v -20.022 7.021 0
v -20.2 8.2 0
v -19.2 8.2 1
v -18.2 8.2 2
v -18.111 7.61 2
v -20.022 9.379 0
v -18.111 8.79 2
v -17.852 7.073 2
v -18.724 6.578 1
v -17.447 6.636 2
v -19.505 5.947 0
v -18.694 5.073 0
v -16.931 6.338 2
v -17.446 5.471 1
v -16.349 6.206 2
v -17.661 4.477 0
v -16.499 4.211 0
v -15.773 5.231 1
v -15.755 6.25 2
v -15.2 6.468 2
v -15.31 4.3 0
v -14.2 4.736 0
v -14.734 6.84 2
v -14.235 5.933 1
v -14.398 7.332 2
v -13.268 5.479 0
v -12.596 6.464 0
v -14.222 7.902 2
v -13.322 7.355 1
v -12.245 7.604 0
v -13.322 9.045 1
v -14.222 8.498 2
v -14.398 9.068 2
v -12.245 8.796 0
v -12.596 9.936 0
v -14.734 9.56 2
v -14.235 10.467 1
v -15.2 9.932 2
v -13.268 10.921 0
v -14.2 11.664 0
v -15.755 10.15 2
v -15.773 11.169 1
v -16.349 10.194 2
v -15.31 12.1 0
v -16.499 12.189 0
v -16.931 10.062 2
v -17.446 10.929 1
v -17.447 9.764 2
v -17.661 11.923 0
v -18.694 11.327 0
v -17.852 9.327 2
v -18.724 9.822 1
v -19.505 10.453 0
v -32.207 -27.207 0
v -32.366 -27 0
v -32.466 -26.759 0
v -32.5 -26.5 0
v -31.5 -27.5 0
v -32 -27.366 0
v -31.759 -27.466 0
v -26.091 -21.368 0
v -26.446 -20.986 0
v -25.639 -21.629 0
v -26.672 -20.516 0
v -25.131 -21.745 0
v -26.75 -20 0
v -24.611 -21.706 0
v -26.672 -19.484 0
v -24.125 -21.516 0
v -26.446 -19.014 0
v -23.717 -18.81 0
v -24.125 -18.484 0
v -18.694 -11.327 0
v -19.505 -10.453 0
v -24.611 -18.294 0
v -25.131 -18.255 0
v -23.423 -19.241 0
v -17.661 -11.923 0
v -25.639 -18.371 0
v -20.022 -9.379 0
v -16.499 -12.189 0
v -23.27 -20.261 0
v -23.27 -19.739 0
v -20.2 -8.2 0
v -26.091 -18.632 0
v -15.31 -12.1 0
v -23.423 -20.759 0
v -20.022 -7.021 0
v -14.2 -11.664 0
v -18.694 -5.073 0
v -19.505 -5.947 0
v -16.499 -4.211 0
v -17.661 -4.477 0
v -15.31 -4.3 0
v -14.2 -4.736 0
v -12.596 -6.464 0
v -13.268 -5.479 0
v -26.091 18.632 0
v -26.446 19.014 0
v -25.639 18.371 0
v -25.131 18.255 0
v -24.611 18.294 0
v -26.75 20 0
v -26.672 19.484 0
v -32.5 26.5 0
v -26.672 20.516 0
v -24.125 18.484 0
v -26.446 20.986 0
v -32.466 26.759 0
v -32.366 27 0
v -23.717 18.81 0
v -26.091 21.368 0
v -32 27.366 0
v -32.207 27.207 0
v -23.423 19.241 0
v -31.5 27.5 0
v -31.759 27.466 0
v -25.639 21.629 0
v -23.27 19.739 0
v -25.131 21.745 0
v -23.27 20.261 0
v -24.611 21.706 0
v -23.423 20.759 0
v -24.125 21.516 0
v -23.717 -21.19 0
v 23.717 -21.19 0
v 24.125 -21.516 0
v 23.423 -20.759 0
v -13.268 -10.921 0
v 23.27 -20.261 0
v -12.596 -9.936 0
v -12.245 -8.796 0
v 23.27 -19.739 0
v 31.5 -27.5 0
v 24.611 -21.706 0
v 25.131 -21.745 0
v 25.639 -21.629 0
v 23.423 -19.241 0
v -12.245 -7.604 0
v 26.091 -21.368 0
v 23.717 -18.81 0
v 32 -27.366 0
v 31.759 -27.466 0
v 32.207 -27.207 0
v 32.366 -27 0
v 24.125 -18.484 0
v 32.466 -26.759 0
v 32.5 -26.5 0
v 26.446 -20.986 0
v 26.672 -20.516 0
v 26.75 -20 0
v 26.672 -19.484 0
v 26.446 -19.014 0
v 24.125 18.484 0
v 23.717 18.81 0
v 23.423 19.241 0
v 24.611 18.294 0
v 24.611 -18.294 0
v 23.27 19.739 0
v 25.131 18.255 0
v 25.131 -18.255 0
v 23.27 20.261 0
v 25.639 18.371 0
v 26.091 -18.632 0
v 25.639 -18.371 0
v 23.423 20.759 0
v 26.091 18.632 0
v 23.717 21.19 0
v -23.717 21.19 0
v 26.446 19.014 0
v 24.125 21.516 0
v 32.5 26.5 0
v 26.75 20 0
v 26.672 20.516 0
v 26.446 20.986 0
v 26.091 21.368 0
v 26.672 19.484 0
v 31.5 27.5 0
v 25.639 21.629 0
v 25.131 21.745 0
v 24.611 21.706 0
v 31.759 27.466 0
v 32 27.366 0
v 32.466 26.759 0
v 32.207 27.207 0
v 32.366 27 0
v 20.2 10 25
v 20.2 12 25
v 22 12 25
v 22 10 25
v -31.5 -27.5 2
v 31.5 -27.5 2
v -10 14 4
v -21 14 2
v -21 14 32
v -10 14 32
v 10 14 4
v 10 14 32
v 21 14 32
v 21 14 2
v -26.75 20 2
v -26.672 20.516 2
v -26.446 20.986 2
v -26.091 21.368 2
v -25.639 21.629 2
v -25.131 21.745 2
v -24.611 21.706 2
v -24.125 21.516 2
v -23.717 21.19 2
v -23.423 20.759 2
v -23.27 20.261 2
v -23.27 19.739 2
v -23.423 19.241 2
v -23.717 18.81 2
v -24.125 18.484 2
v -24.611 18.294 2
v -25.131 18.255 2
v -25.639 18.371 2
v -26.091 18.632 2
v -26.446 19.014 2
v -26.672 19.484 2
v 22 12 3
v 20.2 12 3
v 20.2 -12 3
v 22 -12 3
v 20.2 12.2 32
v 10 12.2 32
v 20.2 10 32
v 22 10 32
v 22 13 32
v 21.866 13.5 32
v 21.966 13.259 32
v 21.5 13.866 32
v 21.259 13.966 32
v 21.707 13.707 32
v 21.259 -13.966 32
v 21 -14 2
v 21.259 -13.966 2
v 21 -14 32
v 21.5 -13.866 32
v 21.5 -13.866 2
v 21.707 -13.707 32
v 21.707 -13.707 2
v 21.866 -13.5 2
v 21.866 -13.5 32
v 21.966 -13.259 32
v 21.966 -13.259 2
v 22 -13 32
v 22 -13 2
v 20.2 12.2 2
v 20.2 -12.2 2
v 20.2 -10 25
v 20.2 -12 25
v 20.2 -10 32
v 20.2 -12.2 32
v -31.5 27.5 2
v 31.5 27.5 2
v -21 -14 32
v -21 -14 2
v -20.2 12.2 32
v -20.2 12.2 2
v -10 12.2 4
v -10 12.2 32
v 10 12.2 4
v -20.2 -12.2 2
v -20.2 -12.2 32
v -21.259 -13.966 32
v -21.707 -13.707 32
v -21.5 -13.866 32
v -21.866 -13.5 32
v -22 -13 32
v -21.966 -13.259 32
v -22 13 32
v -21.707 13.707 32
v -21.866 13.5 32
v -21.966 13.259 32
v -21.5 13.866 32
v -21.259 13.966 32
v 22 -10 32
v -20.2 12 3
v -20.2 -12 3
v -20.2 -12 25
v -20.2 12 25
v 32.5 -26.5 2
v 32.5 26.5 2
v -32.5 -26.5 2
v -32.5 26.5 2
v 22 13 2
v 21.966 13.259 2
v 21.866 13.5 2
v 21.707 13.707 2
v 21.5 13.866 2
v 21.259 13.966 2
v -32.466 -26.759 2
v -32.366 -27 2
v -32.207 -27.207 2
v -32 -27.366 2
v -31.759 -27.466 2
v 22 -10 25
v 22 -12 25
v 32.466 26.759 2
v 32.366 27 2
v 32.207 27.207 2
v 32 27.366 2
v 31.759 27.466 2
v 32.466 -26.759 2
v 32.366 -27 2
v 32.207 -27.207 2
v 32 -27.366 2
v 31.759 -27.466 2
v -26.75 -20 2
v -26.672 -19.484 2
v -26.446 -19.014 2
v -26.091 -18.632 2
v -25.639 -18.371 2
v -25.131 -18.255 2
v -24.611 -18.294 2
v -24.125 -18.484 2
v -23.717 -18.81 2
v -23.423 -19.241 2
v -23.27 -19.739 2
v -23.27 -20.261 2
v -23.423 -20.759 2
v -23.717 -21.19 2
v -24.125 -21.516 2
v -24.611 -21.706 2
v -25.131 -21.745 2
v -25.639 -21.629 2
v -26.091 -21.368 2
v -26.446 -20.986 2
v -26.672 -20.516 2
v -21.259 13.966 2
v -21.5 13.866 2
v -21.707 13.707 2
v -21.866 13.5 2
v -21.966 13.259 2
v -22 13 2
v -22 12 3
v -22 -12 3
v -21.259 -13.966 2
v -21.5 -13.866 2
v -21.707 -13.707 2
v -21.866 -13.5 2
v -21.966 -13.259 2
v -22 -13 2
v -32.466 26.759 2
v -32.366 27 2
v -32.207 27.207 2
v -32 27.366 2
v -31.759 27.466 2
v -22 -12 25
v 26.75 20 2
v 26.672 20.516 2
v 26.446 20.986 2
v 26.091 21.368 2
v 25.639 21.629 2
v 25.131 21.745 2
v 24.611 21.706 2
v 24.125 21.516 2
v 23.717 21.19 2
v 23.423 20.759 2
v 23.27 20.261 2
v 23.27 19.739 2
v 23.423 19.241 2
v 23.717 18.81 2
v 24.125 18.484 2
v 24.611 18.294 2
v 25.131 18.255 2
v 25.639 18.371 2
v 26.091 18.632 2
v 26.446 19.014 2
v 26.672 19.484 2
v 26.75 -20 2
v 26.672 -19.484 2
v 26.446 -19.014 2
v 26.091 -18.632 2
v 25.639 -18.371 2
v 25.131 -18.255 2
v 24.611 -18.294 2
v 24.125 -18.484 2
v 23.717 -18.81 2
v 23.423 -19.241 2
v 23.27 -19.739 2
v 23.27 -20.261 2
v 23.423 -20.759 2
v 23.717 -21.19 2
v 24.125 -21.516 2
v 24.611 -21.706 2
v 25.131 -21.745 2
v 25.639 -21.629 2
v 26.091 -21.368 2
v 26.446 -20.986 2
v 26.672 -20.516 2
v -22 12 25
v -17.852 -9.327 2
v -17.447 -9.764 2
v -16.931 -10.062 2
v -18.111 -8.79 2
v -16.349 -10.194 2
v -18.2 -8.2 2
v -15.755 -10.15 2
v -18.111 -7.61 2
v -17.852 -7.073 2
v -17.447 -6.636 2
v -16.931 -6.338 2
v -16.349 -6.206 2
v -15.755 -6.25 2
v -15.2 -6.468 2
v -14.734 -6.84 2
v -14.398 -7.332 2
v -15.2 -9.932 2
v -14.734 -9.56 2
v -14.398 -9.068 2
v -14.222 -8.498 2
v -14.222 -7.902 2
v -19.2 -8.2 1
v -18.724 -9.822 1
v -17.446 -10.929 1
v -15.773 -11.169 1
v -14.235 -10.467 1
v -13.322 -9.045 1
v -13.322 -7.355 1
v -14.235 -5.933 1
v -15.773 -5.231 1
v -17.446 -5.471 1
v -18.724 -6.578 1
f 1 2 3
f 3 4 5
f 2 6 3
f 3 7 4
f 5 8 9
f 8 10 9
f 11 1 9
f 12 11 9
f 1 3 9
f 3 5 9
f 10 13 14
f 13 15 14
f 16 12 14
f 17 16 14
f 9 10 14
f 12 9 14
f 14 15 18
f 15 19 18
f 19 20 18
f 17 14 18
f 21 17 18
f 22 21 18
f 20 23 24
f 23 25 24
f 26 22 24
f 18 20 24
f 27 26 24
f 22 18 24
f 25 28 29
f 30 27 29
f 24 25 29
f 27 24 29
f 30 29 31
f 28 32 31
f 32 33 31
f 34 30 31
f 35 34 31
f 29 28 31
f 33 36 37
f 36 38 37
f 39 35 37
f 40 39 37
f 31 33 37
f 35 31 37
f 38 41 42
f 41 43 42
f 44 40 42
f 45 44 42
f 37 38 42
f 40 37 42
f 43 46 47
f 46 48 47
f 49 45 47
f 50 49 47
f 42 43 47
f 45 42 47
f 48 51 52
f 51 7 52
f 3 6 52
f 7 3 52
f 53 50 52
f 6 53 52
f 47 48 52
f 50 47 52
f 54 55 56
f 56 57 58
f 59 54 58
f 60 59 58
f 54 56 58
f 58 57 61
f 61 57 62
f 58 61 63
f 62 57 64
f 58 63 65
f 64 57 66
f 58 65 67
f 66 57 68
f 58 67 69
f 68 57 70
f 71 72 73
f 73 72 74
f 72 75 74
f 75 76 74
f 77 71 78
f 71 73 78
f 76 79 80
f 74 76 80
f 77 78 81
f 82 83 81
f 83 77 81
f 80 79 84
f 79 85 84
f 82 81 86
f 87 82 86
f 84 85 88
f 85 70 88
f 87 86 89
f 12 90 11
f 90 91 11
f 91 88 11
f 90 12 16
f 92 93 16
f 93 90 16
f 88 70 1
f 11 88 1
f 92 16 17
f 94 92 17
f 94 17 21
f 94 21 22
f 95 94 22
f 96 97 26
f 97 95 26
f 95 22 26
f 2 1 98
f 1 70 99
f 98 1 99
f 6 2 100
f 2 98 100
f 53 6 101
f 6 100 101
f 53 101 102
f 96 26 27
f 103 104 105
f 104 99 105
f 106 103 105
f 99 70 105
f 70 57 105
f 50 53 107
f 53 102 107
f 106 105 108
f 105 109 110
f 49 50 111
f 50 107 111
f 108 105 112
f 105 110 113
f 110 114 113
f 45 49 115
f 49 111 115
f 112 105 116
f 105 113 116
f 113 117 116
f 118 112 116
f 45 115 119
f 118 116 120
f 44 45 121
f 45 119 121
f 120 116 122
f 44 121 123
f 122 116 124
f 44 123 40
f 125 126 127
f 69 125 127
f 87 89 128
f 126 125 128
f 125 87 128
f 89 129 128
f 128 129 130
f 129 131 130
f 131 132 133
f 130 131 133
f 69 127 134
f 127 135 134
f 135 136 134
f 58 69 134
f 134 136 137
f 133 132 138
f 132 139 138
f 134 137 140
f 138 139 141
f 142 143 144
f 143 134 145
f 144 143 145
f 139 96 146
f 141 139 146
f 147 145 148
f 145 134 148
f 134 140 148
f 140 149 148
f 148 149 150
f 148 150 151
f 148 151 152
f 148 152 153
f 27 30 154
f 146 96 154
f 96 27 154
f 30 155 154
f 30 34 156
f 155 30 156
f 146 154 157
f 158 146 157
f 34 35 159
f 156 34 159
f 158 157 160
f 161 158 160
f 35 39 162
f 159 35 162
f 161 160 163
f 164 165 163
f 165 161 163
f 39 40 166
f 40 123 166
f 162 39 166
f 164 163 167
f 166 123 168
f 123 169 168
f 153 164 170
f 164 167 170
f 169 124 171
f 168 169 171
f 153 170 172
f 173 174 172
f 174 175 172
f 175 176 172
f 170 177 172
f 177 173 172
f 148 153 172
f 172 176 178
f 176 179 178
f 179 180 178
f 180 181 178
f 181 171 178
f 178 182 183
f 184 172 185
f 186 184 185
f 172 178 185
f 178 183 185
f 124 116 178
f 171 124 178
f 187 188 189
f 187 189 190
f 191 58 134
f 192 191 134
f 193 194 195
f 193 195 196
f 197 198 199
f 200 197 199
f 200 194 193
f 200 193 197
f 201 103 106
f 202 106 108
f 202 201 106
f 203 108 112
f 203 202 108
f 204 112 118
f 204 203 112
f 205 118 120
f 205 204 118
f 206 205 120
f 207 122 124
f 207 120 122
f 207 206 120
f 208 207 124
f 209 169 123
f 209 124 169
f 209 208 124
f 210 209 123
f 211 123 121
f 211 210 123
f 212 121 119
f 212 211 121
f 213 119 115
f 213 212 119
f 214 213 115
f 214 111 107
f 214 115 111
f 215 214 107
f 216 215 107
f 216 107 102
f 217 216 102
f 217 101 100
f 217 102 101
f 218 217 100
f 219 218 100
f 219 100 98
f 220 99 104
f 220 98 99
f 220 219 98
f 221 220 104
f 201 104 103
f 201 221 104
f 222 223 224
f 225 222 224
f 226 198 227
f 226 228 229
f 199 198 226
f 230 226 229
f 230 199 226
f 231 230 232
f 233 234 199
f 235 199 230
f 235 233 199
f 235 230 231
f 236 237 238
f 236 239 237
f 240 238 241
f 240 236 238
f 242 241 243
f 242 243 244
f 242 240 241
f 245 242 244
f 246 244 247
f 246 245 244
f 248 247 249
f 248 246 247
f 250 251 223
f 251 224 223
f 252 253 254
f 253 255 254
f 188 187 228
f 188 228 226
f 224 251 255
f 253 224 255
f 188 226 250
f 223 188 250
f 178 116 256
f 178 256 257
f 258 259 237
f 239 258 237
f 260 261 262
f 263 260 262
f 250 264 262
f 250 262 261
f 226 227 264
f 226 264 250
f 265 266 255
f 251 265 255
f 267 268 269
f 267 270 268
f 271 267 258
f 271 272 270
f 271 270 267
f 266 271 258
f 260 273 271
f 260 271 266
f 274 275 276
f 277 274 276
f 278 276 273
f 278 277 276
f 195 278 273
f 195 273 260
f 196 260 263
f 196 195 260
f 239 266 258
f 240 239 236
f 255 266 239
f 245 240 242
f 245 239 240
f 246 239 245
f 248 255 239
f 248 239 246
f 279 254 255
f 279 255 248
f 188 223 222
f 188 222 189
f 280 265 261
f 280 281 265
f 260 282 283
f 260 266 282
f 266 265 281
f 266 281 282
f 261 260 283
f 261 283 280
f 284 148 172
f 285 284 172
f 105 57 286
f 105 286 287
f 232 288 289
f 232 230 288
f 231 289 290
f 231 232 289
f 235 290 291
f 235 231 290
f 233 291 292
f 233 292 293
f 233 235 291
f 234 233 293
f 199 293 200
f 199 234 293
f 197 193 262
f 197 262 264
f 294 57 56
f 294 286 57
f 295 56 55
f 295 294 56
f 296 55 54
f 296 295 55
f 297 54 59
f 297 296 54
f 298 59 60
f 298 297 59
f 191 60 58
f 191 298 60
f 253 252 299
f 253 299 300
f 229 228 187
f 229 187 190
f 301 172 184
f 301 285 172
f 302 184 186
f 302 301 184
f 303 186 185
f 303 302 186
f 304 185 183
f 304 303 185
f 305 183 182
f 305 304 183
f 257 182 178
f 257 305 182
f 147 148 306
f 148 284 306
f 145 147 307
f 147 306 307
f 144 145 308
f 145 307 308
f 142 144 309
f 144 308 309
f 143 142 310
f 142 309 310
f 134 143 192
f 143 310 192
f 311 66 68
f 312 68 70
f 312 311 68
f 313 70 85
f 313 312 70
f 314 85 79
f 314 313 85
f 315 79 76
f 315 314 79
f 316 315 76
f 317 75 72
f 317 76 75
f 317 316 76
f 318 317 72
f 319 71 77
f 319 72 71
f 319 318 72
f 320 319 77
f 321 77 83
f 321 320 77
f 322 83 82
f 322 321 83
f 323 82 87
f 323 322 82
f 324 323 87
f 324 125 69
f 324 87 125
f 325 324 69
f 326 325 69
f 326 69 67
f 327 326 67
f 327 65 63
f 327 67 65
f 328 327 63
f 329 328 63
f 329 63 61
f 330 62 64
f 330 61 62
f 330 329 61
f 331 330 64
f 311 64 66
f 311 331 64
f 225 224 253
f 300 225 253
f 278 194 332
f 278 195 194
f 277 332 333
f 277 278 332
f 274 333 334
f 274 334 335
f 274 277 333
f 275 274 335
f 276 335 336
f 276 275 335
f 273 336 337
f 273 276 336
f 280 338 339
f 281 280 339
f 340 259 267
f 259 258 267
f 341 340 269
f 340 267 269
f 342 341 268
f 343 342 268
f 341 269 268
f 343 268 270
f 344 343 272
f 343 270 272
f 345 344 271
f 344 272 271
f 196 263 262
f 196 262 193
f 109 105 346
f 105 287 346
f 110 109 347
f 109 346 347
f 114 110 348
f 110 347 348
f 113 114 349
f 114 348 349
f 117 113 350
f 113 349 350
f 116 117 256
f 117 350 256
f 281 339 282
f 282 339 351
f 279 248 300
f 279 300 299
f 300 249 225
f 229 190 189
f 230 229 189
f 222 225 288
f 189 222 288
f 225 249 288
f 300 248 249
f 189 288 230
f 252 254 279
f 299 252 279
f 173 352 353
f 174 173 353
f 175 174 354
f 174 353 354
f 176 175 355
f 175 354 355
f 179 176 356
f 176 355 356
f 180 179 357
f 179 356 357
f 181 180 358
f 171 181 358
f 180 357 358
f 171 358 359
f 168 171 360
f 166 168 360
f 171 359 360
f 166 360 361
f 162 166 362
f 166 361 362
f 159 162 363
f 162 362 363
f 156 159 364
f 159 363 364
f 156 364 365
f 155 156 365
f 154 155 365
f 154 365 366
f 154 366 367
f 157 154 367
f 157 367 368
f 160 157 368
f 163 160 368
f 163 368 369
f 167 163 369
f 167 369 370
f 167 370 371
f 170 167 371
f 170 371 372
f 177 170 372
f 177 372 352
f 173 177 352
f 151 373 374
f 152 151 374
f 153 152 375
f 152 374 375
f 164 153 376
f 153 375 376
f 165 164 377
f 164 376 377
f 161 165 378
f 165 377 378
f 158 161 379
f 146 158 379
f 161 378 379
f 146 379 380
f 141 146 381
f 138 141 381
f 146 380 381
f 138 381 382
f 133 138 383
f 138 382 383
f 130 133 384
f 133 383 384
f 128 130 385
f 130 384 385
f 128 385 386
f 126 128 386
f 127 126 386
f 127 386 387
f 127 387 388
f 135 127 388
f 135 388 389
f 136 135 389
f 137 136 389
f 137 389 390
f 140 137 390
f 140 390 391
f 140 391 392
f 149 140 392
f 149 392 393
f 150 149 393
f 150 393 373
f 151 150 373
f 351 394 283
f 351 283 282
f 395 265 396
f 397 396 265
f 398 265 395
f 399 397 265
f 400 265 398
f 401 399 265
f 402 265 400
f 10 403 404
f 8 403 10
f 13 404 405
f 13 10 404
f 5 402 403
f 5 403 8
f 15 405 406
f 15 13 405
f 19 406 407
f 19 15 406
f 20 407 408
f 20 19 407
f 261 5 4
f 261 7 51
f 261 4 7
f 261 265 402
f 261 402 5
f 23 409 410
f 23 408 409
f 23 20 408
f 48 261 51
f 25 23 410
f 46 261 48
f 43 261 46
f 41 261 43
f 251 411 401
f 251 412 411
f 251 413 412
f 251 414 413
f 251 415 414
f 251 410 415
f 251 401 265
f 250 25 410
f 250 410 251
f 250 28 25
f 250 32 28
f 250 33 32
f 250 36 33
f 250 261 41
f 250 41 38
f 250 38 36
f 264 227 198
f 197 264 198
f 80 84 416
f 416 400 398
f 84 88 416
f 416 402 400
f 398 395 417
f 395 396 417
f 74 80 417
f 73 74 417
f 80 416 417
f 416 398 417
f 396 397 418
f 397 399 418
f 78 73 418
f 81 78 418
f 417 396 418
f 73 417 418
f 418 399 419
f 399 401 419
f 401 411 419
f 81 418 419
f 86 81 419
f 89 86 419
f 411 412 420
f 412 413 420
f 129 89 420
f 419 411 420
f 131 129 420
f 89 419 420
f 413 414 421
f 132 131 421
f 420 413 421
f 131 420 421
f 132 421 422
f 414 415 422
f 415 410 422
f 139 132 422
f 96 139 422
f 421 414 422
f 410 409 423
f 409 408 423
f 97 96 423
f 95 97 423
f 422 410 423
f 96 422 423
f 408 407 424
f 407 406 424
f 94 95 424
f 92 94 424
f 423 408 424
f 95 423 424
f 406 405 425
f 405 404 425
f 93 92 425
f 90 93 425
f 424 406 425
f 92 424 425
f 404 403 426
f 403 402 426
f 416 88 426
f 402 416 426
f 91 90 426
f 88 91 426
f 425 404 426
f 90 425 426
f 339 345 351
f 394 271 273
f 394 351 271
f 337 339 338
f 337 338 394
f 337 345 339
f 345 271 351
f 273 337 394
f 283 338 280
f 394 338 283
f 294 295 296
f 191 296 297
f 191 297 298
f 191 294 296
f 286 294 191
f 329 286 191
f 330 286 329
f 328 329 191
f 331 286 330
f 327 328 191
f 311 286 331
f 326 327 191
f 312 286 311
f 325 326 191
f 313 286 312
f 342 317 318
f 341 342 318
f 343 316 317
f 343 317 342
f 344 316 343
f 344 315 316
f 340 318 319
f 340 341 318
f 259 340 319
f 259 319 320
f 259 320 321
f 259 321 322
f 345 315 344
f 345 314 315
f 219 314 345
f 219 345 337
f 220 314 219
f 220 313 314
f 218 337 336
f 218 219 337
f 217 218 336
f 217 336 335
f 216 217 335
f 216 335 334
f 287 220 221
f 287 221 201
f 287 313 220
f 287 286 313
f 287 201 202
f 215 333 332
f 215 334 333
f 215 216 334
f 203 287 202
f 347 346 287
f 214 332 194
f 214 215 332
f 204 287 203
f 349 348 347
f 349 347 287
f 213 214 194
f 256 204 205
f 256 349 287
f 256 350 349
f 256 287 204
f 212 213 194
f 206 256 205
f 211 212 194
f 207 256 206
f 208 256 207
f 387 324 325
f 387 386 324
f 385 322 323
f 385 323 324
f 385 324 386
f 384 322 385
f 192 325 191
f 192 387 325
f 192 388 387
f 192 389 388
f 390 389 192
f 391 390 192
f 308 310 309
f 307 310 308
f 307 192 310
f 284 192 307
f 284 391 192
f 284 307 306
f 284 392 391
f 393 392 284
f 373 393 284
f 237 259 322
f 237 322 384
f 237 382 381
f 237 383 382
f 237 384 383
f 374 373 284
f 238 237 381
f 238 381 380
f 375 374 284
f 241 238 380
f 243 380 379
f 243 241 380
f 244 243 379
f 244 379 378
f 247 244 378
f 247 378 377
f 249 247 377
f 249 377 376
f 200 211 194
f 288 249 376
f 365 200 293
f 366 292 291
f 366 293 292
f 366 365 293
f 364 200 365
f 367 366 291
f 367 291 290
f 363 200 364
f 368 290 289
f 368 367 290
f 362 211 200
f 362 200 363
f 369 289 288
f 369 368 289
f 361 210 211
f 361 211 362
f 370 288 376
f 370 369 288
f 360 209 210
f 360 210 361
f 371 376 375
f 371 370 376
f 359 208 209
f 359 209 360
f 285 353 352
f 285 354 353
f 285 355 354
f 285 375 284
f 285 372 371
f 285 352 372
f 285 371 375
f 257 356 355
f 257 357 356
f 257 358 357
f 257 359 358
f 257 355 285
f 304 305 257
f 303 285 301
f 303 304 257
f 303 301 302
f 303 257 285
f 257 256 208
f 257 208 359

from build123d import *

# Parameters (mm, degrees)
SKETCH057_W         = 65
SKETCH057_H         = 55
PAD015_DEPTH        = 2
SKETCH058_R         = 1.75
HOLE023_DEPTH       = 25
SKETCH059_W         = 44
SKETCH059_H         = 28
PAD016_DEPTH        = 30
SKETCH060_W         = 40.4
SKETCH060_H         = 24.4
POCKET018_DEPTH     = 30
SKETCH061_W         = 20
SKETCH061_H         = 20
SKETCH061_W_2       = 40
POCKET019_DEPTH     = 28
SKETCH062_W         = 24
SKETCH062_H         = 22
POCKET020_DEPTH     = 50
SKETCH063_R         = 1.75
HOLE024_DEPTH       = 25
HOLE025_D           = 3.5
HOLE025_DEPTH       = 25
HOLE025_CSINK_D     = 8
HOLE025_CSINK_ANGLE = 90
HOLE025_TIPS_R      = 1.75
FILLET022_R         = 1
FILLET023_R         = 1


with BuildPart() as part:
    # Sketch057 → Pad015 (new body)
    with BuildSketch(Plane.XY):
        Rectangle(SKETCH057_W, SKETCH057_H)
    extrude(amount=PAD015_DEPTH)

    # Sketch058 (on Face6 of Pad015) → Hole023 (cut)
    with BuildSketch(Plane.XY.offset(2)):
        with Locations((25, 20)):
            Circle(SKETCH058_R)
        with Locations((25, -20)):
            Circle(SKETCH058_R)
    hole023 = extrude(amount=-HOLE023_DEPTH, mode=Mode.SUBTRACT)

    # Mirrored028: Hole023 across Sketch058 V_Axis
    add(hole023.mirror(Plane(origin=(0, 0, 2), x_dir=(0, 0, 1), z_dir=(1, 0, 0))), mode=Mode.SUBTRACT)

    # Sketch059 (on Face5 of Mirrored028) → Pad016 (join)
    with BuildSketch(Plane.XY.offset(2)):
        Rectangle(SKETCH059_W, SKETCH059_H)
    extrude(amount=PAD016_DEPTH)

    # Sketch060 (on Face15 of Pad016) → Pocket018 (cut)
    with BuildSketch(Plane.XY.offset(32)):
        Rectangle(SKETCH060_W, SKETCH060_H)
    extrude(amount=-POCKET018_DEPTH, mode=Mode.SUBTRACT)

    # Sketch061 (on Face15 of Pocket018) → Pocket019 (cut)
    with BuildSketch(Plane.XY.offset(32)):
        with Locations((0, 10)):
            Rectangle(SKETCH061_W, SKETCH061_H)
        with Locations((20, 0)):
            Rectangle(SKETCH061_W_2, SKETCH061_H)
    extrude(amount=-POCKET019_DEPTH, mode=Mode.SUBTRACT)

    # Sketch062 (on Face11 of Pocket019) → Pocket020 (cut)
    with BuildSketch(Plane(origin=(-22, 0, 0), x_dir=(0, -1, 0), z_dir=(-1, 0, 0))):
        with Locations((0, 14)):
            Rectangle(SKETCH062_W, SKETCH062_H)
    extrude(amount=-POCKET020_DEPTH, mode=Mode.SUBTRACT)

    # Sketch063 (on Face35 of Pocket020) → Hole024 (cut)
    with BuildSketch(Plane.XY.offset(2)):
        with Locations((-16.2, 8.2)):
            Circle(SKETCH063_R)
        with Locations((-16.2, -8.2)):
            Circle(SKETCH063_R)
    extrude(amount=-HOLE024_DEPTH, mode=Mode.SUBTRACT)

    # Hole025
    with Locations(Plane(origin=(0, 0, 0), x_dir=(1, 0, 0), z_dir=(0, 0, -1))):
        with Locations((-16.2, -8.2), (-16.2, 8.2)):
            CounterSinkHole(HOLE025_D / 2, HOLE025_CSINK_D / 2, depth=HOLE025_DEPTH, counter_sink_angle=HOLE025_CSINK_ANGLE)

    # Hole025 tips → Hole025 tip 1 section 0
    with BuildSketch(Plane(origin=(0, 0, 25), x_dir=(1, 0, 0), z_dir=(0, 0, -1)), mode=Mode.PRIVATE) as hole025_tip_1_s0:
        with Locations((-16.2, -8.2)):
            Circle(HOLE025_TIPS_R)
    loft([hole025_tip_1_s0.sketch, Vertex(-16.2, 8.2, 26.051506)], mode=Mode.SUBTRACT)

    # Hole025 tips → Hole025 tip 2 section 0
    with BuildSketch(Plane(origin=(0, 0, 25), x_dir=(1, 0, 0), z_dir=(0, 0, -1)), mode=Mode.PRIVATE) as hole025_tip_2_s0:
        with Locations((-16.2, 8.2)):
            Circle(HOLE025_TIPS_R)
    loft([hole025_tip_2_s0.sketch, Vertex(-16.2, -8.2, 26.051506)], mode=Mode.SUBTRACT)

    # Fillet022
    fillet022_edges = [part.edges().sort_by_distance(p)[0] for p in [
        (32.5, -27.5, 1),
        (32.5, 27.5, 1),
        (-32.5, -27.5, 1),
        (-32.5, 27.5, 1),
    ]]
    fillet(fillet022_edges, radius=FILLET022_R)

    # Fillet023
    fillet023_edges = [part.edges().sort_by_distance(p)[0] for p in [
        (22, 14, 17),
        (-22, 14, 17),
        (22, -14, 17),
        (-22, -14, 17),
    ]]
    fillet(fillet023_edges, radius=FILLET023_R)


solid = part.part
